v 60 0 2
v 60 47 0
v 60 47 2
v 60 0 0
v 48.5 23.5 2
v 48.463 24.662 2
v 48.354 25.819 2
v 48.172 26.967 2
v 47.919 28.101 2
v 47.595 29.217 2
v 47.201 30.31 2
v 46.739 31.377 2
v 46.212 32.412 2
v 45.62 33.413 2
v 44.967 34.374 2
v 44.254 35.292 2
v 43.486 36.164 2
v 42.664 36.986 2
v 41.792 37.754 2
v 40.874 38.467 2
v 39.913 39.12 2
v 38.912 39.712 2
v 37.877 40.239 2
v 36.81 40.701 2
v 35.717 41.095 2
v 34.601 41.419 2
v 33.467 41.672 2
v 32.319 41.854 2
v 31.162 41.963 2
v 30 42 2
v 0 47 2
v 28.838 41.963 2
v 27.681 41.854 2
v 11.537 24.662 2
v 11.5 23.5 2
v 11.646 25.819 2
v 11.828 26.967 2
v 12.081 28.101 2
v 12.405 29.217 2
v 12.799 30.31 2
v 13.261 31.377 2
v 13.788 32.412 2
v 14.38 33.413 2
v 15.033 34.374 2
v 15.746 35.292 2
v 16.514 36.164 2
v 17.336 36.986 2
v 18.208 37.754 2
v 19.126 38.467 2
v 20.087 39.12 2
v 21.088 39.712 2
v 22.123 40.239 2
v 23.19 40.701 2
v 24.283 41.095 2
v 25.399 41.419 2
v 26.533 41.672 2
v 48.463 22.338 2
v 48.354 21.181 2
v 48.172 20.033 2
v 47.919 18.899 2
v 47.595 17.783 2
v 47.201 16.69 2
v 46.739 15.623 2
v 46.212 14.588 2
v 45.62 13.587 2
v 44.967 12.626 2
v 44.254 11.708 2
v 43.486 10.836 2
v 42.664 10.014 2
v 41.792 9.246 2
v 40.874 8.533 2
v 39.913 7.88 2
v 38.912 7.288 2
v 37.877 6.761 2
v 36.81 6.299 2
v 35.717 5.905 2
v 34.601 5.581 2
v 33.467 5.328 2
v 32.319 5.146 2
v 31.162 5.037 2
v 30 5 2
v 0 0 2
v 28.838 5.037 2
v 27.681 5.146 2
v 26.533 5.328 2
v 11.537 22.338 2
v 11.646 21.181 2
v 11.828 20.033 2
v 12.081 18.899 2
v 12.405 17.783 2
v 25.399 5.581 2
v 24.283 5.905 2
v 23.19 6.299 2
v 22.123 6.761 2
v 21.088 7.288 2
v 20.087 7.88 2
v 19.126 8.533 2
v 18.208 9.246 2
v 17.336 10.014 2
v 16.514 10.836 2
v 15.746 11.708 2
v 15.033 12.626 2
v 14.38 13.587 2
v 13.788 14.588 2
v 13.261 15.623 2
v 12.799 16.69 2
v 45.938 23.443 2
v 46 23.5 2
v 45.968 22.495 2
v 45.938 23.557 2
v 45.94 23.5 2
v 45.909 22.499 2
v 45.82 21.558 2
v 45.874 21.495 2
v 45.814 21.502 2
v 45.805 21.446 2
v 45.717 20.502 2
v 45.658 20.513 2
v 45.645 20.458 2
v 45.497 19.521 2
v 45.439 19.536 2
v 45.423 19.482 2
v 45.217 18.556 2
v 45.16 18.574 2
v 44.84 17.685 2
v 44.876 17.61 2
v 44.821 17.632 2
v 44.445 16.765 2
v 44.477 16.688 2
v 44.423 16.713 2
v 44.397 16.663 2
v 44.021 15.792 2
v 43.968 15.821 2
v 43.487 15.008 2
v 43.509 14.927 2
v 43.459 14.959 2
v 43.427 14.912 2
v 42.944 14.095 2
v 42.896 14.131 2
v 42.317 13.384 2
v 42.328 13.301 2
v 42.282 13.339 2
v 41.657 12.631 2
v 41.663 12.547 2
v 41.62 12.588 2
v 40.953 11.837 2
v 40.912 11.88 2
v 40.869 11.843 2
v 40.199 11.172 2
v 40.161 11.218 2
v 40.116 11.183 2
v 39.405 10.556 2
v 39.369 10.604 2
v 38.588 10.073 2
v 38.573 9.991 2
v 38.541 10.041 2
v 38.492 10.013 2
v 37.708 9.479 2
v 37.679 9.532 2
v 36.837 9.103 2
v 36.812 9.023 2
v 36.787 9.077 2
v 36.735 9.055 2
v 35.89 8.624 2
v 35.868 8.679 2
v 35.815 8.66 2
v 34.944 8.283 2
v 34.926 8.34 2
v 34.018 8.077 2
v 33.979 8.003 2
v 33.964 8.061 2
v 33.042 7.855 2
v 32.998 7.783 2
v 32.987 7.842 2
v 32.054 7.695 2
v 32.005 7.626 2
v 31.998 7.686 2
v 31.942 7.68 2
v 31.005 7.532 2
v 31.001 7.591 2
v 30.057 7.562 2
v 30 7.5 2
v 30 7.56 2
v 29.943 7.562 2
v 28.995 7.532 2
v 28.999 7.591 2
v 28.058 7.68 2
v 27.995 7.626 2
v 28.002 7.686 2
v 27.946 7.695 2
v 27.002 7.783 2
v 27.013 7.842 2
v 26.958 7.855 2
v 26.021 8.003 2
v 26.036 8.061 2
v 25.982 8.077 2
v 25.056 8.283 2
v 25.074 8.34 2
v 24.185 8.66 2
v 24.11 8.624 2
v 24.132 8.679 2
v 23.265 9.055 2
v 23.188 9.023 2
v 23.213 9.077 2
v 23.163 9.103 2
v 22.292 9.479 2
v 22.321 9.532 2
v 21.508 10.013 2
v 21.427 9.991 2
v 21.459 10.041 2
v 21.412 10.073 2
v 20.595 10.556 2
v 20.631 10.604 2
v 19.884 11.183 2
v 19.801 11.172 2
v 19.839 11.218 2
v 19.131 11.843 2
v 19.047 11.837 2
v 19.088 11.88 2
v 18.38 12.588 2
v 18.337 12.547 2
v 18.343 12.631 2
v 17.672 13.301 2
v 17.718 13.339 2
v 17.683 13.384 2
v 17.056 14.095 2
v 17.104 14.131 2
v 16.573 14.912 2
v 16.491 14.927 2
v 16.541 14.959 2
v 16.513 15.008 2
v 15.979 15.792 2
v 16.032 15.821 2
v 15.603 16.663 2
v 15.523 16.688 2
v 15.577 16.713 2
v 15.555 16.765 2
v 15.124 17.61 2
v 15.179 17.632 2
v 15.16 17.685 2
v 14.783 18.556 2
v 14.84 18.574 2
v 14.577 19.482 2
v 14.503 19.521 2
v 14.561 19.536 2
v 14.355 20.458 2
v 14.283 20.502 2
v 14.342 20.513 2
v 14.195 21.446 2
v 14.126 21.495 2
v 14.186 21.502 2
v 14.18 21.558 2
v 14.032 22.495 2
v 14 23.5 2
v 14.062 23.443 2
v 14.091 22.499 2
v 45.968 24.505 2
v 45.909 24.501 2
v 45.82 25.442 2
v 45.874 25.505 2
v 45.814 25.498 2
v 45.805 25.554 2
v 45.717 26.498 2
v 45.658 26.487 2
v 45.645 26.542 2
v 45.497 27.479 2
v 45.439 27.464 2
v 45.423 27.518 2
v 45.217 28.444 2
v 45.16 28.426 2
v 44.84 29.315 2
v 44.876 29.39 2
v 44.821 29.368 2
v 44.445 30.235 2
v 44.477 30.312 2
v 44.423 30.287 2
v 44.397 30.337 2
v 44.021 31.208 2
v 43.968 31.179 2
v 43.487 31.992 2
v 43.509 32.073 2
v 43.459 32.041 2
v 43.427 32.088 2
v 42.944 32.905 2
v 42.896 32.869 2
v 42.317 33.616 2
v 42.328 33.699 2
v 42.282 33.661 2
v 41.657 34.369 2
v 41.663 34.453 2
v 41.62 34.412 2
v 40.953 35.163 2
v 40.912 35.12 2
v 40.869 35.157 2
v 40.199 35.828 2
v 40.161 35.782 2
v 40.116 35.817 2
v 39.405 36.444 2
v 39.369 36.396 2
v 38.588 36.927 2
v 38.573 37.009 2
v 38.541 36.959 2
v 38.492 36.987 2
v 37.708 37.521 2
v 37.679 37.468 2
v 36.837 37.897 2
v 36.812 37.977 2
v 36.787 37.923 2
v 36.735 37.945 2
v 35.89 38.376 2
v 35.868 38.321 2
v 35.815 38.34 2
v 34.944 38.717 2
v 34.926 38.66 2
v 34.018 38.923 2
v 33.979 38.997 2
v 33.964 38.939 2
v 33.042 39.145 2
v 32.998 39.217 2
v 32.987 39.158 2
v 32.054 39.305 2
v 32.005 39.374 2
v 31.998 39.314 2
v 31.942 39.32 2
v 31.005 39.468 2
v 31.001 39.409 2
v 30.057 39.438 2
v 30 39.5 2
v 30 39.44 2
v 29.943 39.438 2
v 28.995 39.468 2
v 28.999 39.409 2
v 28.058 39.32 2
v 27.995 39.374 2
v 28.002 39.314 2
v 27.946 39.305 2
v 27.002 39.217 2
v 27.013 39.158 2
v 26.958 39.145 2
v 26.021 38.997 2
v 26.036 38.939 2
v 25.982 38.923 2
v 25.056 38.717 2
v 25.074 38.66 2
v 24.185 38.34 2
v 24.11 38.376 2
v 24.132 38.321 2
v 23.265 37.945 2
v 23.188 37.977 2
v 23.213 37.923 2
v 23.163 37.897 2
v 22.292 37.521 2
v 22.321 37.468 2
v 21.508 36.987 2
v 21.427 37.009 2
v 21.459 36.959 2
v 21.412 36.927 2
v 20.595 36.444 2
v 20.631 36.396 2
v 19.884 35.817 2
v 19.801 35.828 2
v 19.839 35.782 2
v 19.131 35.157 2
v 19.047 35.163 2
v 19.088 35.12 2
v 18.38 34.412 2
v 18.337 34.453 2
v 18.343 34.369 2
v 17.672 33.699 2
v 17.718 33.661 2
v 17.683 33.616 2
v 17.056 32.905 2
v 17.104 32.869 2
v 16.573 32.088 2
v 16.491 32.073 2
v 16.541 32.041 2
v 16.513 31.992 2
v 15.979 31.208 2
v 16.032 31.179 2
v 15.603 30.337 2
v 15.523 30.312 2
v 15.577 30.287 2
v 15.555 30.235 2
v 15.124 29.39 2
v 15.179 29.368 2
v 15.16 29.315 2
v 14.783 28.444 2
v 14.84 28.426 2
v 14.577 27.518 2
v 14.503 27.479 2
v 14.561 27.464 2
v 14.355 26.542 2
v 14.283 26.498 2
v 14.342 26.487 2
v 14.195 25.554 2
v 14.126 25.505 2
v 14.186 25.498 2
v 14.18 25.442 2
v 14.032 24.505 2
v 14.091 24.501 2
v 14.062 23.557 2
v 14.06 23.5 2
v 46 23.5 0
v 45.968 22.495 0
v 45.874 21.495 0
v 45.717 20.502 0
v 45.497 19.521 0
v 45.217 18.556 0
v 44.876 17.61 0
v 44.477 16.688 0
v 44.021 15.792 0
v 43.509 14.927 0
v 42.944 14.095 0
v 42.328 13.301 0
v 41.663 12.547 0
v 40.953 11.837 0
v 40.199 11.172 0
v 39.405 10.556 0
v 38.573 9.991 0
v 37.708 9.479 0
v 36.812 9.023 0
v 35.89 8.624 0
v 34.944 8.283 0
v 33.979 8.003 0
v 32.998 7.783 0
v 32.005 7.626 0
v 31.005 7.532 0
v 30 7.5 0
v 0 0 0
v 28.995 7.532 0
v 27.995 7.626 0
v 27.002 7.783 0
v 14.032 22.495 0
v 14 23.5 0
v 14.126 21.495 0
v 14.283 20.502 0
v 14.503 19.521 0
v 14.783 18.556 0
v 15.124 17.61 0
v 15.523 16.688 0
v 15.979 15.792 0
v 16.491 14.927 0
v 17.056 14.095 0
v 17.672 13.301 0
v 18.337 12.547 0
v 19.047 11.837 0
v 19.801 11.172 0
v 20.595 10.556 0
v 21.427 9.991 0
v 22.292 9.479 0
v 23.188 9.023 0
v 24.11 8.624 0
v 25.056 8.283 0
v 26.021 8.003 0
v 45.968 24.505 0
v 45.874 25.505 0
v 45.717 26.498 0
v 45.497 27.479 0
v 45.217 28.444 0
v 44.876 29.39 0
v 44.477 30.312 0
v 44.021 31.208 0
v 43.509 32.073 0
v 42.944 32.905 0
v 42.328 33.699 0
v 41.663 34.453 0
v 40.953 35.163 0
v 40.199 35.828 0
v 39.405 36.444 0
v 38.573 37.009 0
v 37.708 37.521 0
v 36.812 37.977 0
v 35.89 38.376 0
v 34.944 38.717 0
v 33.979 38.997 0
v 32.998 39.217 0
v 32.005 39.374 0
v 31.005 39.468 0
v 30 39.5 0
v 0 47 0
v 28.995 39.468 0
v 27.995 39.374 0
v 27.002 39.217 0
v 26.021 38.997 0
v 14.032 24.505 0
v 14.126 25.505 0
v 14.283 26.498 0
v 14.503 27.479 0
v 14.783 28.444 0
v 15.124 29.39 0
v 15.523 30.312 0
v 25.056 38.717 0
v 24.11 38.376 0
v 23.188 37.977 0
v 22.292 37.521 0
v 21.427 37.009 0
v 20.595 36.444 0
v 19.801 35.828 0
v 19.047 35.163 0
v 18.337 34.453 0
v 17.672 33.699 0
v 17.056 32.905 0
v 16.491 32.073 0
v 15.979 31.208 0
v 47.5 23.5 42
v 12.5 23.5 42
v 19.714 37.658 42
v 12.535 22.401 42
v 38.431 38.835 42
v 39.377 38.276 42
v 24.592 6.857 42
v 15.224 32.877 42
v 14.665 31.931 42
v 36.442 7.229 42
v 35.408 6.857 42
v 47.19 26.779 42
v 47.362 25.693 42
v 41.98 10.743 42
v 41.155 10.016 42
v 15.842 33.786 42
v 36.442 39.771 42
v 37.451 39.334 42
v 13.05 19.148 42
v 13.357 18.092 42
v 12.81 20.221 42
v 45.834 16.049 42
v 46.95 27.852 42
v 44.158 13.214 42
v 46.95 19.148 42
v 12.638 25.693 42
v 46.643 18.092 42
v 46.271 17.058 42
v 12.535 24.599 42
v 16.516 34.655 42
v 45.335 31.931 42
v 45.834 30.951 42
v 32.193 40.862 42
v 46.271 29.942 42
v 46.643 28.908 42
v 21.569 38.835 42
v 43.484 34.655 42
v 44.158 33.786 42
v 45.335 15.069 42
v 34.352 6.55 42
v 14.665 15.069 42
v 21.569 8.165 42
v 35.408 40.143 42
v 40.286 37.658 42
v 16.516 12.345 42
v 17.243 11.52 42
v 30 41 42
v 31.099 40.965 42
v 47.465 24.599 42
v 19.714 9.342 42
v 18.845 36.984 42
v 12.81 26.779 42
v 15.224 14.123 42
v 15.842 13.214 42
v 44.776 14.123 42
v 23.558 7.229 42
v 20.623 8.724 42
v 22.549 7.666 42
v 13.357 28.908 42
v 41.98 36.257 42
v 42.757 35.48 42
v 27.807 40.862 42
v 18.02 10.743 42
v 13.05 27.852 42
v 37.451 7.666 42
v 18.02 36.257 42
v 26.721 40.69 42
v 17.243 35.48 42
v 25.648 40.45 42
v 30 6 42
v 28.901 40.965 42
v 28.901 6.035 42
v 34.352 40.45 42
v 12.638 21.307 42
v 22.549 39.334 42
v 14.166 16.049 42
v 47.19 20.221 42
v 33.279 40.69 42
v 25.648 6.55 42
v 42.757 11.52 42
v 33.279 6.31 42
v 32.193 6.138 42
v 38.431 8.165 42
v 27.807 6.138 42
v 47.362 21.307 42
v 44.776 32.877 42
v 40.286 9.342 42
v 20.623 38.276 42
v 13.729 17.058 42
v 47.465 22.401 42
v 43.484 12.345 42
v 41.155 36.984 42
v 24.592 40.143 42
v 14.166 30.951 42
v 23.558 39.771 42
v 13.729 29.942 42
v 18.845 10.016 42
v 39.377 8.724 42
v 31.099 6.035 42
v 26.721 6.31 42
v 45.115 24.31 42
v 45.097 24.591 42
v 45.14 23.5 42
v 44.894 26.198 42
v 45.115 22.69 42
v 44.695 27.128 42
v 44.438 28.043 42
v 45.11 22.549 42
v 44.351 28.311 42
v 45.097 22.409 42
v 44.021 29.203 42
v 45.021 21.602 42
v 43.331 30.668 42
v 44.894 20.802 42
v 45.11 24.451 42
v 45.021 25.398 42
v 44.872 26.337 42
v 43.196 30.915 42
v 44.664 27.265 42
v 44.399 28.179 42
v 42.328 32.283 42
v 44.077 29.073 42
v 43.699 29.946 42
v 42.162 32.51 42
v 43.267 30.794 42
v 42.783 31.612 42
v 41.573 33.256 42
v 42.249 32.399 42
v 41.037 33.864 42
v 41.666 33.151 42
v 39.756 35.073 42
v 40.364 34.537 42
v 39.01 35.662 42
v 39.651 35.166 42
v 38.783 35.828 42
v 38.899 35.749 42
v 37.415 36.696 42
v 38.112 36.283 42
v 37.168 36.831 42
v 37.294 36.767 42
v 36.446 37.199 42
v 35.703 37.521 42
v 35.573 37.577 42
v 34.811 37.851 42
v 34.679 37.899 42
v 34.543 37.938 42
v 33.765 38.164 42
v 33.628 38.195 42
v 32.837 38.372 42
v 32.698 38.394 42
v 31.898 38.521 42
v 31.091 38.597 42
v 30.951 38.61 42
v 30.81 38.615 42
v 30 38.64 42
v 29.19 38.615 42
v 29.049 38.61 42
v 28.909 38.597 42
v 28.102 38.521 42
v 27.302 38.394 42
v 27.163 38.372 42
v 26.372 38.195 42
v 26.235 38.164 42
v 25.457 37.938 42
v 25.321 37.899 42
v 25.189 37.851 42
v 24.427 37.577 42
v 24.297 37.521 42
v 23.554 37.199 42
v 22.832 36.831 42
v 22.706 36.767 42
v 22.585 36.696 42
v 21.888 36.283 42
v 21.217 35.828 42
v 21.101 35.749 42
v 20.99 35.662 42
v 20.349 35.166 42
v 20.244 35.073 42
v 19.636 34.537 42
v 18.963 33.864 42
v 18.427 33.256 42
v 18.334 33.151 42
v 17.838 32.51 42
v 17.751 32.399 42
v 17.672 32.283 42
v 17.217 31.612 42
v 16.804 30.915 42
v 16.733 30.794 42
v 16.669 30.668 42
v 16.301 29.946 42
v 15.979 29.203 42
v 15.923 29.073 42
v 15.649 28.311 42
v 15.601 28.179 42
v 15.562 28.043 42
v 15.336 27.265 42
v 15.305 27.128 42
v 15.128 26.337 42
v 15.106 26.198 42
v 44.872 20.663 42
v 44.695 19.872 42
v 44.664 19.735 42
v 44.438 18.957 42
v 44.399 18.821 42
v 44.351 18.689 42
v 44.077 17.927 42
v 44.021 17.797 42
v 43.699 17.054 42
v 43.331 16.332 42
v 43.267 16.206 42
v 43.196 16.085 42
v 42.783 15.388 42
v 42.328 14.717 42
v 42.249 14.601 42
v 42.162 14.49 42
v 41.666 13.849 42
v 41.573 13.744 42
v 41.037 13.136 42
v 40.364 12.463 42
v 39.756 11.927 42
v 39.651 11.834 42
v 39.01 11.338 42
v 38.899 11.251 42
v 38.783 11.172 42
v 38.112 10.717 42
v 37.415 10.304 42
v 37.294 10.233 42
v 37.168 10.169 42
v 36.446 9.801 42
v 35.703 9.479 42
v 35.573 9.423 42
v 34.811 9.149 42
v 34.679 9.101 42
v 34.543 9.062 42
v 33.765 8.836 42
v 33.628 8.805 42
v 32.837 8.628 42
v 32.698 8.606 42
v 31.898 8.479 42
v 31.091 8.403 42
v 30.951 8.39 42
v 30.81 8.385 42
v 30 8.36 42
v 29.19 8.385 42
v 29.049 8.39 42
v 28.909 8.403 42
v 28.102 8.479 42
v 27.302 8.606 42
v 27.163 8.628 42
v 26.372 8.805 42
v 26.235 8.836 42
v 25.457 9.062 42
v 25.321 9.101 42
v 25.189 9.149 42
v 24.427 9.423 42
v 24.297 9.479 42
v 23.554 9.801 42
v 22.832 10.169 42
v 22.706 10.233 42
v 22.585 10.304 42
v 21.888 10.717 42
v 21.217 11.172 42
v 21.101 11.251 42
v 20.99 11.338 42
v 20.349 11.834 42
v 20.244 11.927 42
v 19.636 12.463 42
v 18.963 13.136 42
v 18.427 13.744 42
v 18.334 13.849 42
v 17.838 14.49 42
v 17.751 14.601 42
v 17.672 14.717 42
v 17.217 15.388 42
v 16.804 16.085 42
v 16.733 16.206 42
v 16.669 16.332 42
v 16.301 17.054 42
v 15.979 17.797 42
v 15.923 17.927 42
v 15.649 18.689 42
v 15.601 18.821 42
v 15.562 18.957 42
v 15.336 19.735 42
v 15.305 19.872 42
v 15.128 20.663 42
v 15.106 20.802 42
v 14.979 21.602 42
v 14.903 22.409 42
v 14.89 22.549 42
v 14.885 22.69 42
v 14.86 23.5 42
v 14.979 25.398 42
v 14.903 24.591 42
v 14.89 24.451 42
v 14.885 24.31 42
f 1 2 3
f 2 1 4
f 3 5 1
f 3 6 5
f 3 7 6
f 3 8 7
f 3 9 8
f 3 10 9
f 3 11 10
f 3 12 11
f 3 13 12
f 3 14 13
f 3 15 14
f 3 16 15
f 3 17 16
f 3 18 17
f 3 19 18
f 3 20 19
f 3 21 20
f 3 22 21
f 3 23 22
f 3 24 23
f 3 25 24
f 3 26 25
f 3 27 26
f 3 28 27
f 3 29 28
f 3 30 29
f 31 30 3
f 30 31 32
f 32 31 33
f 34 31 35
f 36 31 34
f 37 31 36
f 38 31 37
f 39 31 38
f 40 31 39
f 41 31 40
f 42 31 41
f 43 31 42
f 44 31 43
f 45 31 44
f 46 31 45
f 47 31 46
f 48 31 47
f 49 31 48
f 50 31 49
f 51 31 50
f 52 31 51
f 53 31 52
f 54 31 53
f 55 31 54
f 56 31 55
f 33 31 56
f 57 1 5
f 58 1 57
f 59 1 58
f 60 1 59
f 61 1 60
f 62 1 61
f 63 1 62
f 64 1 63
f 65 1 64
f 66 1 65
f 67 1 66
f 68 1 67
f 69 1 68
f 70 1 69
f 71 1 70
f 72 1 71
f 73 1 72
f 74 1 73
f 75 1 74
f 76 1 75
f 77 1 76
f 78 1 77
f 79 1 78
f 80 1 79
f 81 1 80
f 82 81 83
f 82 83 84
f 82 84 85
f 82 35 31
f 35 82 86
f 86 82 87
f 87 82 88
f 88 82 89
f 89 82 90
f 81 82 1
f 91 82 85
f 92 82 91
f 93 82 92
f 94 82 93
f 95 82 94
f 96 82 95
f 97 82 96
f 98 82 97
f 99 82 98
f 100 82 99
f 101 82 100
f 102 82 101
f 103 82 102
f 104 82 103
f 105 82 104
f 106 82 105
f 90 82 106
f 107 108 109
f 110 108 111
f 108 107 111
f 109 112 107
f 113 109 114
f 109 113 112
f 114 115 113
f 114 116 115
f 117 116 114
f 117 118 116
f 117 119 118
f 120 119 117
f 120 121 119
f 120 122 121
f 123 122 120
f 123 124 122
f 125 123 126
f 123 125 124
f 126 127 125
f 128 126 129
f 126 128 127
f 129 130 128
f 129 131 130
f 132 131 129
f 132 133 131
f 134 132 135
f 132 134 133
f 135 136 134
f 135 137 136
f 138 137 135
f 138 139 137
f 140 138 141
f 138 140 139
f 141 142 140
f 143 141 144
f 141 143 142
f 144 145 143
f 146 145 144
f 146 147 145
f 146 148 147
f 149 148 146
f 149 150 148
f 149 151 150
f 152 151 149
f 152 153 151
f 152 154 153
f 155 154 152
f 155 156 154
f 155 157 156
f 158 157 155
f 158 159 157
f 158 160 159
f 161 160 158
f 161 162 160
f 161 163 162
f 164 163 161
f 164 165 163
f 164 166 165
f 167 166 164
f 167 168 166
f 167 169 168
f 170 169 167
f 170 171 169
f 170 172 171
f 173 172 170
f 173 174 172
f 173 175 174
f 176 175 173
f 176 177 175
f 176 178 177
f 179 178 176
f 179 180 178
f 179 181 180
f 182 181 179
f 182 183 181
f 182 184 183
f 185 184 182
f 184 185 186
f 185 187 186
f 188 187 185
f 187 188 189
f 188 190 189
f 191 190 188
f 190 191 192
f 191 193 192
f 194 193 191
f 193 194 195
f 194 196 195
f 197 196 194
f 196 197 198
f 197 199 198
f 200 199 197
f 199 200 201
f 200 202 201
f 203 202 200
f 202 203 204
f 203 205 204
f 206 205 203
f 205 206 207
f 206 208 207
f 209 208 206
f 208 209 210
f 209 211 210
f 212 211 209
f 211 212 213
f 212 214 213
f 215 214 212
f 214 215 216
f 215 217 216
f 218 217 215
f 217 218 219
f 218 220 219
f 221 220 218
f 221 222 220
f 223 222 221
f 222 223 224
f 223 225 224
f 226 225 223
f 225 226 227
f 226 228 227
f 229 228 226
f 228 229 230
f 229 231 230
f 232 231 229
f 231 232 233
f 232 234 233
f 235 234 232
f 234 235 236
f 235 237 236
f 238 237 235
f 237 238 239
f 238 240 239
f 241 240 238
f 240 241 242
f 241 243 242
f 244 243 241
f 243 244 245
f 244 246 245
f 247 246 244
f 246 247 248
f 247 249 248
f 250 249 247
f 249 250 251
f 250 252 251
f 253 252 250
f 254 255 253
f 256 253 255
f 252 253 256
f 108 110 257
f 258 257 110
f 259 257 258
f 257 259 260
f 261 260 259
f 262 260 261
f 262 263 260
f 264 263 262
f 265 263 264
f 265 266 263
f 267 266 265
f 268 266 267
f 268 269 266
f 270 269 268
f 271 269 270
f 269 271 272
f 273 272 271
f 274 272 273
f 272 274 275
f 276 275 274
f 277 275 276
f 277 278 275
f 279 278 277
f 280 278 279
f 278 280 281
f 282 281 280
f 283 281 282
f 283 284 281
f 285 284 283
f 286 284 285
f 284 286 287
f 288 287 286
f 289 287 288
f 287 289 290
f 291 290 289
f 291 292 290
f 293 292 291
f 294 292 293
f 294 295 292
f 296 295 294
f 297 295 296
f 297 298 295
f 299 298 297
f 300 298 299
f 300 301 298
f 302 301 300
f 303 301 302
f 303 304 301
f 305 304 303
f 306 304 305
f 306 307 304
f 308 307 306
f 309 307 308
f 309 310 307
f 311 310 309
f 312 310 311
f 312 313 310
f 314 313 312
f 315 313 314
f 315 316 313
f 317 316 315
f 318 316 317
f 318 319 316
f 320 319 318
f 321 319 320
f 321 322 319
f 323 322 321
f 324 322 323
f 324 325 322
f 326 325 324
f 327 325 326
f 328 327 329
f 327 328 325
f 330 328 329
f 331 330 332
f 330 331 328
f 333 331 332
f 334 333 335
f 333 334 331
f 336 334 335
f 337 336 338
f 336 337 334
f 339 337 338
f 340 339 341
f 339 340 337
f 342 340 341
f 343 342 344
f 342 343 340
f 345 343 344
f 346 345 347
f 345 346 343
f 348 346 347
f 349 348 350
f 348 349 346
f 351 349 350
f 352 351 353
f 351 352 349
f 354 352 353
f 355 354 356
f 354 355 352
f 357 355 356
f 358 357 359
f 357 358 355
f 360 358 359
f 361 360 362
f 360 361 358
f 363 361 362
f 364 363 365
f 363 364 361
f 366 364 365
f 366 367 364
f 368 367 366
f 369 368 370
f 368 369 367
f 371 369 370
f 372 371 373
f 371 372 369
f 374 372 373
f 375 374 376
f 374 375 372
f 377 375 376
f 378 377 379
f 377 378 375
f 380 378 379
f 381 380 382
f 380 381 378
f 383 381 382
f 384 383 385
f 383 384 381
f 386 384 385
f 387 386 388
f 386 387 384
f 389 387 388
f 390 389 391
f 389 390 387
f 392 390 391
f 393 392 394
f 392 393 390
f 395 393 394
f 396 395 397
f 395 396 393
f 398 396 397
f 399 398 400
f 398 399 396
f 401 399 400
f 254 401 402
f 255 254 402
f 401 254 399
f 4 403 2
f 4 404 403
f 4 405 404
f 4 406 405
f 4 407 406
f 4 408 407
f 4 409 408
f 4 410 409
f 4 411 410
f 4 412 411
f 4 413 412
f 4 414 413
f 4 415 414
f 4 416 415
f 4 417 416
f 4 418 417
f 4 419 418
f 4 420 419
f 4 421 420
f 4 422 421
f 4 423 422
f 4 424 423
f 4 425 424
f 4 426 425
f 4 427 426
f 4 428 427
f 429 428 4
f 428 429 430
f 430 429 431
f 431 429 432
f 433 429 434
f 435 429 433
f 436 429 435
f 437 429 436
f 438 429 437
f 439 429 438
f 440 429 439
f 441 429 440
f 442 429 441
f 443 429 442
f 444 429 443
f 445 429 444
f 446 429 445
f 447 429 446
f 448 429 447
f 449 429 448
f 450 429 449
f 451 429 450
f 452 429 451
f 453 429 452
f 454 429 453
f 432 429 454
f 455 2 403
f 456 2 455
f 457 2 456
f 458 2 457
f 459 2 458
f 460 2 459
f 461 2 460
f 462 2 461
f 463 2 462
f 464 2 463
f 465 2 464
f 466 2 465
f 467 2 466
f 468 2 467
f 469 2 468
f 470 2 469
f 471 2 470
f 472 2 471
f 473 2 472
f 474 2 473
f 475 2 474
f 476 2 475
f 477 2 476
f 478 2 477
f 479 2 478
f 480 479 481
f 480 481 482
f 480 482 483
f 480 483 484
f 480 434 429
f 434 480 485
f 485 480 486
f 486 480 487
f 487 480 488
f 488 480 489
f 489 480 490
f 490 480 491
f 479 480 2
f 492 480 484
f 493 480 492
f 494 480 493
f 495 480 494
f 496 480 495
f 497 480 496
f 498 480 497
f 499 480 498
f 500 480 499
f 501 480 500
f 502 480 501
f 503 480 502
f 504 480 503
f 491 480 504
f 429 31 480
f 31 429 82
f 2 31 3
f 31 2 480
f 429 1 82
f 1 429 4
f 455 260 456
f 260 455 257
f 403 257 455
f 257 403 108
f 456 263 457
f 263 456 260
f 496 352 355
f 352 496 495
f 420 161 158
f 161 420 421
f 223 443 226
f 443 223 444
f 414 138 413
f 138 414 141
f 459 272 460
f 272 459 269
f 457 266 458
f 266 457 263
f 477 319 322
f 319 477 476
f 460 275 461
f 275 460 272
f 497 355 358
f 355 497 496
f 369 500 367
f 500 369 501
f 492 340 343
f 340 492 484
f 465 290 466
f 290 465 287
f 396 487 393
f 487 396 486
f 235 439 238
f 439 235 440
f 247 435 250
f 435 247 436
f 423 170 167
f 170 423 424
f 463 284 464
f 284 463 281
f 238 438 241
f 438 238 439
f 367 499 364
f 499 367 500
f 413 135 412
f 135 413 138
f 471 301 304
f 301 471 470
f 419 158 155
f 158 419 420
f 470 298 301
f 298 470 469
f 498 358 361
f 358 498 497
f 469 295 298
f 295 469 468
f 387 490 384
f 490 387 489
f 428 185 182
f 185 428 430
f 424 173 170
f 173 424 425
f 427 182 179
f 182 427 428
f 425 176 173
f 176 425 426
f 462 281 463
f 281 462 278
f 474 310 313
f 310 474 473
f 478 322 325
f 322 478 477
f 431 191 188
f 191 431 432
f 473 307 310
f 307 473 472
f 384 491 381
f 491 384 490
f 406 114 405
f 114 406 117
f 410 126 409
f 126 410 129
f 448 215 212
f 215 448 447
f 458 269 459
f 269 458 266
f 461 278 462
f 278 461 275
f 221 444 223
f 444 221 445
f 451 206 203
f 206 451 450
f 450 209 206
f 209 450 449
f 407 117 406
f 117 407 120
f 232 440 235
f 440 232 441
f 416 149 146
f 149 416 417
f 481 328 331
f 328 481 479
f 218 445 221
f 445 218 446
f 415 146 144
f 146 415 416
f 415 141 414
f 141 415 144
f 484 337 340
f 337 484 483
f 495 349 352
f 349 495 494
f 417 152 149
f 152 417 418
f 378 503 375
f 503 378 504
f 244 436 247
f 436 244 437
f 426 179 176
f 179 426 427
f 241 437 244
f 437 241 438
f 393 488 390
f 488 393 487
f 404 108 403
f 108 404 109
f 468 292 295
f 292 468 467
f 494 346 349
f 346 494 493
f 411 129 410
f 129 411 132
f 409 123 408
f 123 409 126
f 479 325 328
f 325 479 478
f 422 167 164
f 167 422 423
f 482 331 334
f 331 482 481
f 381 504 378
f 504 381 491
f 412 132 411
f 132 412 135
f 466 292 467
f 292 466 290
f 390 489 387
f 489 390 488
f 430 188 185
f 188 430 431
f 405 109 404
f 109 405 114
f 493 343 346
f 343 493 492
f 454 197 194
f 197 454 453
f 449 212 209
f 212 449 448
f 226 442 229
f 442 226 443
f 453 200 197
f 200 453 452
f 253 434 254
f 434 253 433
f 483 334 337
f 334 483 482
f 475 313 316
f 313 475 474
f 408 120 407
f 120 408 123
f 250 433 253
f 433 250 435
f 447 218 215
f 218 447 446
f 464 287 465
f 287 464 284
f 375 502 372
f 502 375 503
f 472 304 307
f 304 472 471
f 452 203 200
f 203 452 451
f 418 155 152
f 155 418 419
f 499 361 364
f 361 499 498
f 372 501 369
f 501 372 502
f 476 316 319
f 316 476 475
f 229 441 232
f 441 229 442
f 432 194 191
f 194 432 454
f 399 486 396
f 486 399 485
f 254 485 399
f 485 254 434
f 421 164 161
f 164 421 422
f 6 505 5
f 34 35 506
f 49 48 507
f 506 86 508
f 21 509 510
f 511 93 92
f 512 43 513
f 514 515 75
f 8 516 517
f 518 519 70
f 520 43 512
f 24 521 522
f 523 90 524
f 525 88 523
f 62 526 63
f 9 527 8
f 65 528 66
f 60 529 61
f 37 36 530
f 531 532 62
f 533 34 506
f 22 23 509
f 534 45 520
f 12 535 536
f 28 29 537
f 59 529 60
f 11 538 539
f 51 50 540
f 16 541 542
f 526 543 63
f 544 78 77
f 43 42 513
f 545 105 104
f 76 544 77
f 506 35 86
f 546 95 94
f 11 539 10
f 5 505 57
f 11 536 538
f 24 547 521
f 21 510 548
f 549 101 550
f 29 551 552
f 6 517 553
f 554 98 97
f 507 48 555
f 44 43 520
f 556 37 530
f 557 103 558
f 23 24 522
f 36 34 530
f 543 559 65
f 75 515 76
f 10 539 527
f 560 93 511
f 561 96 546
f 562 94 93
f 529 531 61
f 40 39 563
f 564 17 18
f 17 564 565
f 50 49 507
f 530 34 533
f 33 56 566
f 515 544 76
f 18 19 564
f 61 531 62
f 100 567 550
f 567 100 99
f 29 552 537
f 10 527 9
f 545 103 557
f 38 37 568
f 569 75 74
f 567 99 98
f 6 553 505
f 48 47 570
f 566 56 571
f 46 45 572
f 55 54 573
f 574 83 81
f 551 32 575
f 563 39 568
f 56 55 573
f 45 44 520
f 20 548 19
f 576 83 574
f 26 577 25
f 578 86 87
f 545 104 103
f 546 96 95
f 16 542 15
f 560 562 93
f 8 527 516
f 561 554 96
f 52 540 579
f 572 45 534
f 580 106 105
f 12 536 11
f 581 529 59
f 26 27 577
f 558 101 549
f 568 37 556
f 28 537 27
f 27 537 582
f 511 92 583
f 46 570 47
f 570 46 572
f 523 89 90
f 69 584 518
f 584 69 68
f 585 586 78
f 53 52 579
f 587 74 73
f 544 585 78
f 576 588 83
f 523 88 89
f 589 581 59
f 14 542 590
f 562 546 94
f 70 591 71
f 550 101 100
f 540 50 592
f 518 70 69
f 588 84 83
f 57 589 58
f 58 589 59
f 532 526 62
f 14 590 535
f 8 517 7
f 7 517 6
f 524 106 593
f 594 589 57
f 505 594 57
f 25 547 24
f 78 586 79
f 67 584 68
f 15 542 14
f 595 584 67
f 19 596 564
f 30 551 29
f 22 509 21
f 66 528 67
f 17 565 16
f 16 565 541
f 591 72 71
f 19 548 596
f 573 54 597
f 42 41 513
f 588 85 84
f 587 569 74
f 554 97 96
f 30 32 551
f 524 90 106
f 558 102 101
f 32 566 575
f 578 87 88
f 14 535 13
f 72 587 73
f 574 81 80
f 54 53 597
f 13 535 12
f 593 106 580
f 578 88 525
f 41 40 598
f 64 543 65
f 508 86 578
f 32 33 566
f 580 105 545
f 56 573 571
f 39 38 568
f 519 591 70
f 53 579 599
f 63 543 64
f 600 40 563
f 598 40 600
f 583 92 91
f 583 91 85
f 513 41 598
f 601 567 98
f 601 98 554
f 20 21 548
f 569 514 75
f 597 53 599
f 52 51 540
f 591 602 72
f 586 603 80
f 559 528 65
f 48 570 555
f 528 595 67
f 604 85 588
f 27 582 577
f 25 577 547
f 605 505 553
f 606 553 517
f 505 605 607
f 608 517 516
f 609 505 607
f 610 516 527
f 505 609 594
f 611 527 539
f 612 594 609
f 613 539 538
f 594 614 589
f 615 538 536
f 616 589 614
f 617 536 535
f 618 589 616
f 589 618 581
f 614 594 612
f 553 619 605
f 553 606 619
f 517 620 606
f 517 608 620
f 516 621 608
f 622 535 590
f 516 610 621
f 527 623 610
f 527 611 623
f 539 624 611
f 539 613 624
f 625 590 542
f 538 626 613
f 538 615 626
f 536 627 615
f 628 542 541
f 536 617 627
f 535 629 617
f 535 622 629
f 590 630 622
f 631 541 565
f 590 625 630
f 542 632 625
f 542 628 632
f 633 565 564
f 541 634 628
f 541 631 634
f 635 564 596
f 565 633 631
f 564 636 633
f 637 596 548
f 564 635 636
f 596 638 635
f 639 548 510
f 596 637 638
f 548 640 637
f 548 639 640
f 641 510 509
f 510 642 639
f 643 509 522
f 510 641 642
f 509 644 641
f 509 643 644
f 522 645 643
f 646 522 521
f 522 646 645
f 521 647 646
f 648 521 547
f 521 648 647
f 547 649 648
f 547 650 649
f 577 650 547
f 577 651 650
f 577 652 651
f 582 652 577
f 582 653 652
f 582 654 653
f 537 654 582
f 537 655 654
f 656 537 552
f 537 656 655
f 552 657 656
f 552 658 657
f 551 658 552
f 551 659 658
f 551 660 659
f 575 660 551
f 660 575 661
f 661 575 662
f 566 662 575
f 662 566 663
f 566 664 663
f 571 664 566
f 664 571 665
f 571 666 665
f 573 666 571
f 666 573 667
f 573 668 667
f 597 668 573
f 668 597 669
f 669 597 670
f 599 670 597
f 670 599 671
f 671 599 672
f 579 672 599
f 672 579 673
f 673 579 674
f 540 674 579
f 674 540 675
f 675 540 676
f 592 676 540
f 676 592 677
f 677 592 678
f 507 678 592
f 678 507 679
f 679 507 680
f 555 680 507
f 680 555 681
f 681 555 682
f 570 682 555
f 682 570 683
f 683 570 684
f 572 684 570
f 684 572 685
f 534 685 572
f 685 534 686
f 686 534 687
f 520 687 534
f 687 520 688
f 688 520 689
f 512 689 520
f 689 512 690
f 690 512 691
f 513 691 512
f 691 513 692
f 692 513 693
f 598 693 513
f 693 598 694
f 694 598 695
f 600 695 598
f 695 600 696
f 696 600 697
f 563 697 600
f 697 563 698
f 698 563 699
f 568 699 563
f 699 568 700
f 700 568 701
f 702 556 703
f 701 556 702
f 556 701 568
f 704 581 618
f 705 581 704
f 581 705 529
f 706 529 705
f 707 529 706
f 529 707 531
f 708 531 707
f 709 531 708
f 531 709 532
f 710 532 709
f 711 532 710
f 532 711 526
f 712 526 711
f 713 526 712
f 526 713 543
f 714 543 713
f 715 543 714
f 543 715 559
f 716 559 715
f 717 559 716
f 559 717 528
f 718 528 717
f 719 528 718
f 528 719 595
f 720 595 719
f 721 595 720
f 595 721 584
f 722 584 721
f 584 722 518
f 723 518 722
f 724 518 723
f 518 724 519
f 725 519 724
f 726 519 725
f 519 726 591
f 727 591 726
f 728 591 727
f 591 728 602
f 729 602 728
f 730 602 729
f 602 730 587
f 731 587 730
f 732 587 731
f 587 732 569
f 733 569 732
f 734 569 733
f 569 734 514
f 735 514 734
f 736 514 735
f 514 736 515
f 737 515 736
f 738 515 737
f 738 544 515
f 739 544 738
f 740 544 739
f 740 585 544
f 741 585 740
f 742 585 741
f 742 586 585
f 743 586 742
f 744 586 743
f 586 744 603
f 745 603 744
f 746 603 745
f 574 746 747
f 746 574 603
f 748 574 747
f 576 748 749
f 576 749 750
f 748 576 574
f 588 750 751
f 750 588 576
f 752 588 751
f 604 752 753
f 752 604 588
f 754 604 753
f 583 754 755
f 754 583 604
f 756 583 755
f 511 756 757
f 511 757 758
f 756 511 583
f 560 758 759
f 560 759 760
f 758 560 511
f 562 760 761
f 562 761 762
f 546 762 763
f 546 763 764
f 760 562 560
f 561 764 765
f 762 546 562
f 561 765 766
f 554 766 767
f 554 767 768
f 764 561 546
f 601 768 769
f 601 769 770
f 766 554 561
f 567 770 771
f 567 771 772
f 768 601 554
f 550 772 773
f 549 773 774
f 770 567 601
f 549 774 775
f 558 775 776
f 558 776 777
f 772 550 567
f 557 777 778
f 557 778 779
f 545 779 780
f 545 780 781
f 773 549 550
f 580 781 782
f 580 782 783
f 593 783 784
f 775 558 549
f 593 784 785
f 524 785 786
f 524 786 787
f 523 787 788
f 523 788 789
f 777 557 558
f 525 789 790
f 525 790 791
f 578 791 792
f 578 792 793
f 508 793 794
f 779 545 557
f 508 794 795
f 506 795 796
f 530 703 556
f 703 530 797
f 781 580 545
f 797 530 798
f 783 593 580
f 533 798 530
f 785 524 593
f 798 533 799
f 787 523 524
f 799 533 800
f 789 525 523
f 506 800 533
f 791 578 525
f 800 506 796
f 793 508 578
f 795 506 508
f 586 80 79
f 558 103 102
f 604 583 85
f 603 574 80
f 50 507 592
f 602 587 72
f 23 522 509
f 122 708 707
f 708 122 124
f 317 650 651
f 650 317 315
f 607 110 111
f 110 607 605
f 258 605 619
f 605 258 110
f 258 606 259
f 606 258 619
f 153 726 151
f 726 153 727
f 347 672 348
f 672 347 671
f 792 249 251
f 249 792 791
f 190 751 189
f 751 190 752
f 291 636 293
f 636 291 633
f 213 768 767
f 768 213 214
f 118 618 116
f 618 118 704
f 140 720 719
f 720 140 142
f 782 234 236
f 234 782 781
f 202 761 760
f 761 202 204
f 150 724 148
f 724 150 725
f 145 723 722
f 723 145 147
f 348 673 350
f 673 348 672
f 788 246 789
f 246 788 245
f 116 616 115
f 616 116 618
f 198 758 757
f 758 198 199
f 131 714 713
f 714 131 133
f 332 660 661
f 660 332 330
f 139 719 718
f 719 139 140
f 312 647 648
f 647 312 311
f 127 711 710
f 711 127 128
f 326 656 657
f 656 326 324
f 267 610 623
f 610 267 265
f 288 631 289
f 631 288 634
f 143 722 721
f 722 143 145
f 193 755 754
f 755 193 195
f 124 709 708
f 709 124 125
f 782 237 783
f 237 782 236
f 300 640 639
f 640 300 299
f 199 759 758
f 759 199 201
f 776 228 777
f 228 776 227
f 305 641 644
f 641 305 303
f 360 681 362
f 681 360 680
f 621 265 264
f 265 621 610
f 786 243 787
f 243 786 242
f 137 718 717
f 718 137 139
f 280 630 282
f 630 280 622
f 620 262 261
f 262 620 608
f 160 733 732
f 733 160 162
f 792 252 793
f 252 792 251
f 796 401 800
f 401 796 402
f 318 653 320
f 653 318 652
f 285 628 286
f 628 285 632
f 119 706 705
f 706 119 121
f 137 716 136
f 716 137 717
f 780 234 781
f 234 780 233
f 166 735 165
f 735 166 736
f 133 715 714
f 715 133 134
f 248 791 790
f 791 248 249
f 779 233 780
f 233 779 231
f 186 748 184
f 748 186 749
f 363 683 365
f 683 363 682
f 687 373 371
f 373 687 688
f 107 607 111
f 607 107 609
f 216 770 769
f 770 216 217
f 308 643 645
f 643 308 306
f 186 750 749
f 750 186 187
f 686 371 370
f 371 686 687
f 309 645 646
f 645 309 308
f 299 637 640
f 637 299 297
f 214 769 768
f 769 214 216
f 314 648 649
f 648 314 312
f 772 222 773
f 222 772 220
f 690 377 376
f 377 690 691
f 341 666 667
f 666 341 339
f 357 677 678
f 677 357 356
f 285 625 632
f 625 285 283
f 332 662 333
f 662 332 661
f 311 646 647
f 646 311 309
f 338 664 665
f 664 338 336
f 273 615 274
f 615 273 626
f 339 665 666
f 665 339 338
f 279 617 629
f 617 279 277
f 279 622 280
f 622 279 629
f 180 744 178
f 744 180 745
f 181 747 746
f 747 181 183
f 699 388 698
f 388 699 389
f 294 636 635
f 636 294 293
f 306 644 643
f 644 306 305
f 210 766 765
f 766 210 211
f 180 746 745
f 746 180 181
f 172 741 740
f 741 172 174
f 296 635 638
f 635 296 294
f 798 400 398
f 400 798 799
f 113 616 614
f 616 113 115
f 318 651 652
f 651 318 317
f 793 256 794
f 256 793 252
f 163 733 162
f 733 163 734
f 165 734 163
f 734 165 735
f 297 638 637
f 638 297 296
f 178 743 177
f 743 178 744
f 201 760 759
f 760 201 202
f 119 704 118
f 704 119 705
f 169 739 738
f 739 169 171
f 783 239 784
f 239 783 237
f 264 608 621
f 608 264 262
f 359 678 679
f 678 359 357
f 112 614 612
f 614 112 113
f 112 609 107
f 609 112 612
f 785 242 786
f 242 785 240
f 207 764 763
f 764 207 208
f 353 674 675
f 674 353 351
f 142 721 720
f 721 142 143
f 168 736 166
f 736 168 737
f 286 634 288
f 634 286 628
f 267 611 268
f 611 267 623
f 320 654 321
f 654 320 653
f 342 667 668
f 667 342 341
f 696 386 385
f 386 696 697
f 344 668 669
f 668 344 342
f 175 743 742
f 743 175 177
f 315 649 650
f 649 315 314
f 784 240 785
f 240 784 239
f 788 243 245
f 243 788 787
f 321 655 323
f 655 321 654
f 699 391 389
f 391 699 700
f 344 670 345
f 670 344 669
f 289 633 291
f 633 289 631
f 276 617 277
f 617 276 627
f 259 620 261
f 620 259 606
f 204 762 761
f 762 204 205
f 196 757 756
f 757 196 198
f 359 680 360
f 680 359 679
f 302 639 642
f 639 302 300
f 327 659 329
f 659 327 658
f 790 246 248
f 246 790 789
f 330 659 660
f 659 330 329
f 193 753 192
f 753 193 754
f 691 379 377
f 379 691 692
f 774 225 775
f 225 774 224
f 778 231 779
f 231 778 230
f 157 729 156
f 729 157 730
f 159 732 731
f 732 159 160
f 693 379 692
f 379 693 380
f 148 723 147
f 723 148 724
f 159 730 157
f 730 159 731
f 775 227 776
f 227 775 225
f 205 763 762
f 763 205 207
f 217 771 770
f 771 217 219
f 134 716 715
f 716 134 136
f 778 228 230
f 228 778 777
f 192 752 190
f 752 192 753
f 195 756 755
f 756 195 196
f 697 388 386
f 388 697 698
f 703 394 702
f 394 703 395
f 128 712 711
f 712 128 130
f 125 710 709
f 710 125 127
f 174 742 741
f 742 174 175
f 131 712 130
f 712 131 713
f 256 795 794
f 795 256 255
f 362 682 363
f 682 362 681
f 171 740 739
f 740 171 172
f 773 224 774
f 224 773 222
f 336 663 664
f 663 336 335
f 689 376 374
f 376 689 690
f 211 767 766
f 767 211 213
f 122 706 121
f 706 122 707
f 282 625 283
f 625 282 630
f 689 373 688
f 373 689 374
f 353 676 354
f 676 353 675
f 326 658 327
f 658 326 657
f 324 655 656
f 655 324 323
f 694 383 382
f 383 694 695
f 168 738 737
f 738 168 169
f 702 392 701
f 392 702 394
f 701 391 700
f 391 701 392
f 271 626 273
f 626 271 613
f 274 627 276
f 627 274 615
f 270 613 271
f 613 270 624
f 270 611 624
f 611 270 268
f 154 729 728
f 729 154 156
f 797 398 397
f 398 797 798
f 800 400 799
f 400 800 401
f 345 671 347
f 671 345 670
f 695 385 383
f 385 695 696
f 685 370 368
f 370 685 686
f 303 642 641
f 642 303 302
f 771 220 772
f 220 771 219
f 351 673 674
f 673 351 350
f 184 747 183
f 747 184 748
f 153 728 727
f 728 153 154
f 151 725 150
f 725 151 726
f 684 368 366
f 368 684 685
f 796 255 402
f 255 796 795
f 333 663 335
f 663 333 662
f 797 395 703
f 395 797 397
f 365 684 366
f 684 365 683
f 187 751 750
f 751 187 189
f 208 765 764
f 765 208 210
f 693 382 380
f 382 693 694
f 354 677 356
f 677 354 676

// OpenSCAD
// Eyepiece mount
union() {
 // base and hole
    translate([0,0,0]) {
        difference() {
            cube([60,47, 2]);
            translate([30,23.5,-2]) 
            cylinder(h=5, d=32, $fn=100);
        }
    }
// Eyepiece tube
difference() {
    translate([30,23.5,2]) {
        cylinder(h=40, d1=37, d2=35, $fn=100);
    }
    translate([30,23.5,-1]) {
        color([1,0,0])
        cylinder(h=50, d1=32, d2=30, $fn=100);
    }
  }
}
